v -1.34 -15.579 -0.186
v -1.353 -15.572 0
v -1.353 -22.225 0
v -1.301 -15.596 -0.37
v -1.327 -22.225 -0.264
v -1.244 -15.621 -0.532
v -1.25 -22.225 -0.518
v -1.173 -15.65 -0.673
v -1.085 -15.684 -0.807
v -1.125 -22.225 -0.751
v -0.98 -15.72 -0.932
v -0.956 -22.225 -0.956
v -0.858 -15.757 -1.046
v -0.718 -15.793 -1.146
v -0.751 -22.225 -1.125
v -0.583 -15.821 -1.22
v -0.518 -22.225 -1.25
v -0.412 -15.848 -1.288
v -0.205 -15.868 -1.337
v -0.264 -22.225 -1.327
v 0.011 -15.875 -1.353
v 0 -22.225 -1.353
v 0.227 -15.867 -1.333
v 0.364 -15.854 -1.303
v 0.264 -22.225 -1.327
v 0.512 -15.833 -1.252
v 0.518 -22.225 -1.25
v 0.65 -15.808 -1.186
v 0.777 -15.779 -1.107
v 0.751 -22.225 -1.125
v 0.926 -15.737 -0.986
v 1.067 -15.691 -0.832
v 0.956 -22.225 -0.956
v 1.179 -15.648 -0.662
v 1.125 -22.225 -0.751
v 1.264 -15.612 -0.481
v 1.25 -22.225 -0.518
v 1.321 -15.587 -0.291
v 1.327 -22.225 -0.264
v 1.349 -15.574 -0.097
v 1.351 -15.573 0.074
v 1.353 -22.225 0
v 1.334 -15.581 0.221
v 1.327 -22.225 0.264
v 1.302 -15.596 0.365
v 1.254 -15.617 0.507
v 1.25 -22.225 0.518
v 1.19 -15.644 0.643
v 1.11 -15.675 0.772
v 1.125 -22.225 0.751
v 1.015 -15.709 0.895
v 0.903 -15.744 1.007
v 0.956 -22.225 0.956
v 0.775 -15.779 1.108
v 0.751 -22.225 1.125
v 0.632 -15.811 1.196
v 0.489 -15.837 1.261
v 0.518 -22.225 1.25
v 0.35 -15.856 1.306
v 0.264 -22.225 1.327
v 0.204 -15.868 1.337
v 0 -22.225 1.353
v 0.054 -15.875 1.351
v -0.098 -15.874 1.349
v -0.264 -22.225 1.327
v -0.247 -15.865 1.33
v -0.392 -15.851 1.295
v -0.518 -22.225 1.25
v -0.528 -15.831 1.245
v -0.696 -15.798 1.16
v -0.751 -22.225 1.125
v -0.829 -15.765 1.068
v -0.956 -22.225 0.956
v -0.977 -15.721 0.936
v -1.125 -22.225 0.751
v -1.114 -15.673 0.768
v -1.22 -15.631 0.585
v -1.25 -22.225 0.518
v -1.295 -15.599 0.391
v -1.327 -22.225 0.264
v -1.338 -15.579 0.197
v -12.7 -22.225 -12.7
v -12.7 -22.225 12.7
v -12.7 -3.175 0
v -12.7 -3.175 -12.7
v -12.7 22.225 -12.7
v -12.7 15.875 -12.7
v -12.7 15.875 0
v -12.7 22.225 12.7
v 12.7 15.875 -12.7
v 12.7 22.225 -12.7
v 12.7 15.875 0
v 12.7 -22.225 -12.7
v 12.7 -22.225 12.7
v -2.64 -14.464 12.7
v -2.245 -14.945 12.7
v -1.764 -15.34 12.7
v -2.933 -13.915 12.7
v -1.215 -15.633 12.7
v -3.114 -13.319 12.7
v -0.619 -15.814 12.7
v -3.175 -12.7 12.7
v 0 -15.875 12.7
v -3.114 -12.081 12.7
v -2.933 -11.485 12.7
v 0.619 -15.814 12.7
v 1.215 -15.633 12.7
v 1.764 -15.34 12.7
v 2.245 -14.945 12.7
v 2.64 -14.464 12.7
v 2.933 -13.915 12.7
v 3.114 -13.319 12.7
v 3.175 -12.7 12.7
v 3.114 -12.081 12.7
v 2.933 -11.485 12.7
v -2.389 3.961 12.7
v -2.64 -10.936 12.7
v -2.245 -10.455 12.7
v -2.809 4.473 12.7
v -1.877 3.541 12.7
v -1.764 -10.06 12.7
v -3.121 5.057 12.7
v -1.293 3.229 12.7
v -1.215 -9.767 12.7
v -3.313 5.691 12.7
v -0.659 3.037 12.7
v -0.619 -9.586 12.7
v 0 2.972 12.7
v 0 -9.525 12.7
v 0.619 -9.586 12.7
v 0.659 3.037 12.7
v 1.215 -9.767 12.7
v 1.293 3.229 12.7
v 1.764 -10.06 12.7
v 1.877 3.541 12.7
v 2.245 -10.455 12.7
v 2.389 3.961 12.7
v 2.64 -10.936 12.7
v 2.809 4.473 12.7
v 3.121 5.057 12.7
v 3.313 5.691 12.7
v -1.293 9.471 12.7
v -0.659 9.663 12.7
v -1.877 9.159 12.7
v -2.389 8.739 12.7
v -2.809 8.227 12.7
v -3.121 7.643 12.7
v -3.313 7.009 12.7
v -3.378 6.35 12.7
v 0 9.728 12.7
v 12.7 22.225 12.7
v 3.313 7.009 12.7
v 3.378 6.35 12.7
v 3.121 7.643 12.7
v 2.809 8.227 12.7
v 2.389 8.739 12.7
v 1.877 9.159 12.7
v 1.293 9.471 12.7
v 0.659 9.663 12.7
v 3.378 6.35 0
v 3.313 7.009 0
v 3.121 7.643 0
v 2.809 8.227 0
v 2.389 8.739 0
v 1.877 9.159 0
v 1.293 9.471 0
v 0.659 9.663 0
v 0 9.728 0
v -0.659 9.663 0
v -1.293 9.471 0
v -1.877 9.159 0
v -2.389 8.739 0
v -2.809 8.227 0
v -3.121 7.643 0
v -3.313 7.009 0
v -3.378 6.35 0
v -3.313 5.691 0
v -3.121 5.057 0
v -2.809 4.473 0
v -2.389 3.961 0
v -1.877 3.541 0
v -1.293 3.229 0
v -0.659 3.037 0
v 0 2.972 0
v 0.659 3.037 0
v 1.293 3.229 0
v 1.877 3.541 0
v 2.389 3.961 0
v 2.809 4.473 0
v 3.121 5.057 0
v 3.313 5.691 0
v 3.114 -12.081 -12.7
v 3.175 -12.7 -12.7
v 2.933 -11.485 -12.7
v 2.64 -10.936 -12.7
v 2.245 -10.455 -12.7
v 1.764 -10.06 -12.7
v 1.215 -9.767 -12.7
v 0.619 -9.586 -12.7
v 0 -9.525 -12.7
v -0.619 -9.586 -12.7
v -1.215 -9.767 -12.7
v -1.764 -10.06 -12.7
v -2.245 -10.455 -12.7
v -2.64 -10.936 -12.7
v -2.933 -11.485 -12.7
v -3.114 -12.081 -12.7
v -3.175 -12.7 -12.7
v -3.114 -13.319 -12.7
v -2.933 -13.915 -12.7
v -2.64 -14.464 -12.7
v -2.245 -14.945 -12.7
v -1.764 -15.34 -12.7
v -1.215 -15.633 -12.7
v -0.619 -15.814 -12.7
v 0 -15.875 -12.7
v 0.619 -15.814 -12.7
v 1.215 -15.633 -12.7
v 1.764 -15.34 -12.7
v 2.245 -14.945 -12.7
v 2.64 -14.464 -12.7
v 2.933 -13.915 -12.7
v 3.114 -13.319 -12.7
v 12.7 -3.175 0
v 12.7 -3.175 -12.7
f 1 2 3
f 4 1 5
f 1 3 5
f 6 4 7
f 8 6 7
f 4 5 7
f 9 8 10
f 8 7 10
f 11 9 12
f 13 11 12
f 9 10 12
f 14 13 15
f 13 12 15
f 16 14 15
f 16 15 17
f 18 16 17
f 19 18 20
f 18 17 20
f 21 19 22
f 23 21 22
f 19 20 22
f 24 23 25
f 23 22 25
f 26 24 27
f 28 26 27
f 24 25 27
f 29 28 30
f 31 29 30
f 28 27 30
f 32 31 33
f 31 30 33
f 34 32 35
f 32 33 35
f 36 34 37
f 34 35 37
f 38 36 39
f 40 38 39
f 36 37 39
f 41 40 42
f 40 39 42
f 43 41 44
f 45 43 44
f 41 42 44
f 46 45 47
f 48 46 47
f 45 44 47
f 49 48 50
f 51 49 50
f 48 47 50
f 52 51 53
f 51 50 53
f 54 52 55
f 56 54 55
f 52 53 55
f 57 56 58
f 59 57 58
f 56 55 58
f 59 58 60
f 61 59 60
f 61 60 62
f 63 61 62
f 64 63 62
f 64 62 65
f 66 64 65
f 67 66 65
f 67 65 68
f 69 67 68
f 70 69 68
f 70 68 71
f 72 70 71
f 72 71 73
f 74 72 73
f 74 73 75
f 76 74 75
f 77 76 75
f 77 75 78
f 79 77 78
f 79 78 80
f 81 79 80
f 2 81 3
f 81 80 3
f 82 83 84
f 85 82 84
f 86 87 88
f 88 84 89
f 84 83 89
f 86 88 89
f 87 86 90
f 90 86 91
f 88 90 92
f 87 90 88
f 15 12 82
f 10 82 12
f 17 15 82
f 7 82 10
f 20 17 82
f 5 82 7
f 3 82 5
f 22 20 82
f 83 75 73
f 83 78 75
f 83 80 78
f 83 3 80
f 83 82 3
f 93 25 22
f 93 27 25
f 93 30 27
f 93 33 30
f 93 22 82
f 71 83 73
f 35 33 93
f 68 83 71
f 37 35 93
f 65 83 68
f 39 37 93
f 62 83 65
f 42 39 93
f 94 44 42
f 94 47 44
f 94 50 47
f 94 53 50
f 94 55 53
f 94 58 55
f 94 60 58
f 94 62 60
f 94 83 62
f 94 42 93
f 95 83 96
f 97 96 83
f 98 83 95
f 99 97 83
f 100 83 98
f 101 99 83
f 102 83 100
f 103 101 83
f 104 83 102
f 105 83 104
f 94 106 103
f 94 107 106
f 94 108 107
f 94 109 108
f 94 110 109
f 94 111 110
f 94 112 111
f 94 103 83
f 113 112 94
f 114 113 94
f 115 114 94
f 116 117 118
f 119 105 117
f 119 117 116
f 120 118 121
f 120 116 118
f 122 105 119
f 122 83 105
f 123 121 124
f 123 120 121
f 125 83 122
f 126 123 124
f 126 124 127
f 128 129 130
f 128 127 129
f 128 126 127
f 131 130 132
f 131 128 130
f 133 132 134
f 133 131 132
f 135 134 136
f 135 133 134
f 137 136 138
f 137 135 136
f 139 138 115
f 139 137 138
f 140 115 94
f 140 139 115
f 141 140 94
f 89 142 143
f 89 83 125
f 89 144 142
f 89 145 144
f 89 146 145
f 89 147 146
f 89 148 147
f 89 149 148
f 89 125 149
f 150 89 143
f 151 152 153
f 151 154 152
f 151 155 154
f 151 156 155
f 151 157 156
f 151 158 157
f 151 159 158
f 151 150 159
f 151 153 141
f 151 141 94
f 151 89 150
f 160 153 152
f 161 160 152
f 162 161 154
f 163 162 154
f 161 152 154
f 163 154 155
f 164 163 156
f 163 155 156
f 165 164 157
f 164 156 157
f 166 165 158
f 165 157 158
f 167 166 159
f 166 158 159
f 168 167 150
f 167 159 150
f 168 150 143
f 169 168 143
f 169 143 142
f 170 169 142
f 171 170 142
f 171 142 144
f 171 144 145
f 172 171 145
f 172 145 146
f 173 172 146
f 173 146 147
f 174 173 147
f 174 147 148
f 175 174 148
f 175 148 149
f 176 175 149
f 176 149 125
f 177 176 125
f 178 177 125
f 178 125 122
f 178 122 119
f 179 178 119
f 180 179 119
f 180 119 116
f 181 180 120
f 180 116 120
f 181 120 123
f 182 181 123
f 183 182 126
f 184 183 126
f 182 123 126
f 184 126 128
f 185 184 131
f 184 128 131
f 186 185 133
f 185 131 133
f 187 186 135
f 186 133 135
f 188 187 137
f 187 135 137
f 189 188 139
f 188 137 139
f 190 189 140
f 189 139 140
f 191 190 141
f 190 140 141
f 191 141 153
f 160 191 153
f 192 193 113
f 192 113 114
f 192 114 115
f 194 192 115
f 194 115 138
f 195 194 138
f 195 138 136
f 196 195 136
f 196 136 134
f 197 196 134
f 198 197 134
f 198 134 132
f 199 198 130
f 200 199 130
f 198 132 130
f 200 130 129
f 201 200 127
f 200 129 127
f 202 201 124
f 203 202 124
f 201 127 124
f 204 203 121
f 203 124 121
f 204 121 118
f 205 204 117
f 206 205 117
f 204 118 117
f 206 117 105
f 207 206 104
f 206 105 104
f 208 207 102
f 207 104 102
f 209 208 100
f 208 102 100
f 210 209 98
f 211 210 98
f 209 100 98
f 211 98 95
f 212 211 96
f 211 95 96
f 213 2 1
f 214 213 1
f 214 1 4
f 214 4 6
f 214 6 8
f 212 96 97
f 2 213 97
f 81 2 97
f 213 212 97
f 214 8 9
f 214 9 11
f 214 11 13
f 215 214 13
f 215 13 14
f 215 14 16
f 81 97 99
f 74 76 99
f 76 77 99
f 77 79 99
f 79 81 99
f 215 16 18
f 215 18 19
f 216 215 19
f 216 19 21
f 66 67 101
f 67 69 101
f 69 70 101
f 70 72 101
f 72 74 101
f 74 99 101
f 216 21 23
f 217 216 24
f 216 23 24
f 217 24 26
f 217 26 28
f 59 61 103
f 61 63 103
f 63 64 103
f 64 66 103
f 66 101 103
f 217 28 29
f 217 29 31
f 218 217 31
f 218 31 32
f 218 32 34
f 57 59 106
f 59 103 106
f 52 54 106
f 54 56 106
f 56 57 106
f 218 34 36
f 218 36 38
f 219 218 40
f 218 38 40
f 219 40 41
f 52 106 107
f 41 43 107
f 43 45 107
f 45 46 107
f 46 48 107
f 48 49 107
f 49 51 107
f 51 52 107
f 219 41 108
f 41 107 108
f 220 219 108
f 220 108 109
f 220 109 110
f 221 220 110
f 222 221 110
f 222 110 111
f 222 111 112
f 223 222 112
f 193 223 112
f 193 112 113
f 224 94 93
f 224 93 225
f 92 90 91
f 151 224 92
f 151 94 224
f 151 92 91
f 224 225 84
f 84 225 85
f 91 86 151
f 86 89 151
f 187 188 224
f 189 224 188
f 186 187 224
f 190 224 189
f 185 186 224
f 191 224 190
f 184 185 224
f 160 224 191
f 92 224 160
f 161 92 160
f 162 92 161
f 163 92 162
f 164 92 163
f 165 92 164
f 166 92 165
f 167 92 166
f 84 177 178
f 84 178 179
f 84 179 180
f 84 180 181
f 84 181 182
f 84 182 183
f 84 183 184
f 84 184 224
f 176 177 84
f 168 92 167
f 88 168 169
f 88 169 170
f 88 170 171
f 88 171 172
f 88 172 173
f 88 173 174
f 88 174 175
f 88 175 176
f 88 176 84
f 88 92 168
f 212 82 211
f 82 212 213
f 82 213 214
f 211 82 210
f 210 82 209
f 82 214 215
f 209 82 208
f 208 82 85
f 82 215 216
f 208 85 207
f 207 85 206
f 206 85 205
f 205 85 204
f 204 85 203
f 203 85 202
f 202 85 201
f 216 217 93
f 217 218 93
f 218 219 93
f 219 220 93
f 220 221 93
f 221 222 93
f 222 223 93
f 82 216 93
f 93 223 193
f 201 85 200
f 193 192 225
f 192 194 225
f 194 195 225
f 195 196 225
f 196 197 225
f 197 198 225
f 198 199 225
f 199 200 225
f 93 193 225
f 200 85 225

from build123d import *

# Parameters (mm, degrees)
SKETCH1_W                  = 25.4
SKETCH1_H                  = 44.45
BOSS_EXTRUDE1_DEPTH        = 12.7
SKETCH2_W                  = 25.4
SKETCH2_H                  = 19.05
CUT_EXTRUDE1_DEPTH         = 12.7
SKETCH3_R                  = 3.175
CUT_EXTRUDE2_DEPTH         = 37.061067996
F_1_4_CLEARANCE_HOLE1_D    = 6.7564
F_6_32_TAPPED_HOLE1_REACH  = 49.941
F_6_32_TAPPED_HOLE1_BORE_R = 1.35255


with BuildPart() as part:
    # Sketch1 → Boss-Extrude1 (new, symmetric)
    with BuildSketch(Plane.XY):
        Rectangle(SKETCH1_W, SKETCH1_H)
    extrude(amount=BOSS_EXTRUDE1_DEPTH, both=True)

    # Sketch2 → Cut-Extrude1 (cut)
    with BuildSketch(Plane(origin=(0, 0, -12.7), x_dir=(-1, 0, 0), z_dir=(0, 0, -1))):
        with Locations((0, 6.35)):
            Rectangle(SKETCH2_W, SKETCH2_H)
    extrude(amount=-CUT_EXTRUDE1_DEPTH, mode=Mode.SUBTRACT)

    # Sketch3 → Cut-Extrude2 (cut, through all)
    with BuildSketch(Plane.XY.offset(12.7)):
        with Locations((0, -12.7)):
            Circle(SKETCH3_R)
    extrude(amount=-CUT_EXTRUDE2_DEPTH, mode=Mode.SUBTRACT)

    # 1/4 Clearance Hole1 (through all)
    with Locations(Plane(origin=(0, 0, 0), x_dir=(-1, 0, 0), z_dir=(0, 0, -1))):
        with Locations((0, 6.35)):
            Hole(F_1_4_CLEARANCE_HOLE1_D / 2)

    # #6-32 Tapped Hole1 bore → #6-32 Tapped Hole1 (cut, up to next)
    with BuildSketch(Plane(origin=(0, -22.225, 0), x_dir=(-1, 0, 0), z_dir=(0, -1, 0)), mode=Mode.PRIVATE) as f_6_32_tapped_hole1_sk1:
        Circle(F_6_32_TAPPED_HOLE1_BORE_R)
    f_6_32_tapped_hole1_tool1 = extrude(f_6_32_tapped_hole1_sk1.sketch, amount=-F_6_32_TAPPED_HOLE1_REACH, mode=Mode.PRIVATE) & part.part
    add(f_6_32_tapped_hole1_tool1.solids().sort_by_distance((0, -22.225, 0))[0], mode=Mode.SUBTRACT)


solid = part.part
